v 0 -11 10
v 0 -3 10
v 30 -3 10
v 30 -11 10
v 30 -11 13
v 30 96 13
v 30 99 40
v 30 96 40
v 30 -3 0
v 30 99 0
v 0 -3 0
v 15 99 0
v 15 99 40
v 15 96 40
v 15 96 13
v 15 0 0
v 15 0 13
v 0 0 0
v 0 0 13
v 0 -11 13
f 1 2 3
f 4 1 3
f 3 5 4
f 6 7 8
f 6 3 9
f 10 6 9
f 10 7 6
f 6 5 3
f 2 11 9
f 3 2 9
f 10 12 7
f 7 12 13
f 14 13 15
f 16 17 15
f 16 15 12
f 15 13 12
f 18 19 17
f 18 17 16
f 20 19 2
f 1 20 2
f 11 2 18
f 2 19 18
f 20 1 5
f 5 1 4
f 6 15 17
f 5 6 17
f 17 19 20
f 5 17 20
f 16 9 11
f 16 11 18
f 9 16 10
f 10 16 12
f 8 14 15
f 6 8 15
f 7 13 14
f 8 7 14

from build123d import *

# Parameters (mm, degrees)
SKETCH_1_W          = 30
SKETCH_1_H          = 3
EXTRUDE_2_DEPTH     = 11
SKETCH_1_5_W        = 30
SKETCH_1_5_H        = 10
EXTRUDE_3_DEPTH     = 3
EXTRUDE_4_DEPTH     = 30
CUT_EXTRUDE_1_DEPTH = 15


with BuildPart() as part:
    # 草图1 → 凸台-拉伸2 (new body)
    with BuildSketch(Plane(origin=(0, 0, 0), x_dir=(1, 0, 0), z_dir=(0, 1, 0))):
        with Locations((15, -11.5)):
            Rectangle(SKETCH_1_W, SKETCH_1_H)
    extrude(amount=-EXTRUDE_2_DEPTH)

    # 草图1<5> → 凸台-拉伸3 (add)
    with BuildSketch(Plane(origin=(0, 0, 0), x_dir=(1, 0, 0), z_dir=(0, 1, 0))):
        with Locations((15, -5)):
            Rectangle(SKETCH_1_5_W, SKETCH_1_5_H)
    extrude(amount=-EXTRUDE_3_DEPTH)

    # 草图3 → 凸台-拉伸4 (add)
    with BuildSketch(Plane.ZY):
        Polygon((0, 0), (0, 99), (40, 99), (40, 96), (13, 96), (13, 0), align=None)
    extrude(amount=-EXTRUDE_4_DEPTH)

    # 草图3<4> → 切除-拉伸1 (cut)
    with BuildSketch(Plane.ZY):
        Polygon((0, 0), (0, 99), (40, 99), (40, 96), (13, 96), (13, 0), align=None)
    extrude(amount=-CUT_EXTRUDE_1_DEPTH, mode=Mode.SUBTRACT)


solid = part.part
